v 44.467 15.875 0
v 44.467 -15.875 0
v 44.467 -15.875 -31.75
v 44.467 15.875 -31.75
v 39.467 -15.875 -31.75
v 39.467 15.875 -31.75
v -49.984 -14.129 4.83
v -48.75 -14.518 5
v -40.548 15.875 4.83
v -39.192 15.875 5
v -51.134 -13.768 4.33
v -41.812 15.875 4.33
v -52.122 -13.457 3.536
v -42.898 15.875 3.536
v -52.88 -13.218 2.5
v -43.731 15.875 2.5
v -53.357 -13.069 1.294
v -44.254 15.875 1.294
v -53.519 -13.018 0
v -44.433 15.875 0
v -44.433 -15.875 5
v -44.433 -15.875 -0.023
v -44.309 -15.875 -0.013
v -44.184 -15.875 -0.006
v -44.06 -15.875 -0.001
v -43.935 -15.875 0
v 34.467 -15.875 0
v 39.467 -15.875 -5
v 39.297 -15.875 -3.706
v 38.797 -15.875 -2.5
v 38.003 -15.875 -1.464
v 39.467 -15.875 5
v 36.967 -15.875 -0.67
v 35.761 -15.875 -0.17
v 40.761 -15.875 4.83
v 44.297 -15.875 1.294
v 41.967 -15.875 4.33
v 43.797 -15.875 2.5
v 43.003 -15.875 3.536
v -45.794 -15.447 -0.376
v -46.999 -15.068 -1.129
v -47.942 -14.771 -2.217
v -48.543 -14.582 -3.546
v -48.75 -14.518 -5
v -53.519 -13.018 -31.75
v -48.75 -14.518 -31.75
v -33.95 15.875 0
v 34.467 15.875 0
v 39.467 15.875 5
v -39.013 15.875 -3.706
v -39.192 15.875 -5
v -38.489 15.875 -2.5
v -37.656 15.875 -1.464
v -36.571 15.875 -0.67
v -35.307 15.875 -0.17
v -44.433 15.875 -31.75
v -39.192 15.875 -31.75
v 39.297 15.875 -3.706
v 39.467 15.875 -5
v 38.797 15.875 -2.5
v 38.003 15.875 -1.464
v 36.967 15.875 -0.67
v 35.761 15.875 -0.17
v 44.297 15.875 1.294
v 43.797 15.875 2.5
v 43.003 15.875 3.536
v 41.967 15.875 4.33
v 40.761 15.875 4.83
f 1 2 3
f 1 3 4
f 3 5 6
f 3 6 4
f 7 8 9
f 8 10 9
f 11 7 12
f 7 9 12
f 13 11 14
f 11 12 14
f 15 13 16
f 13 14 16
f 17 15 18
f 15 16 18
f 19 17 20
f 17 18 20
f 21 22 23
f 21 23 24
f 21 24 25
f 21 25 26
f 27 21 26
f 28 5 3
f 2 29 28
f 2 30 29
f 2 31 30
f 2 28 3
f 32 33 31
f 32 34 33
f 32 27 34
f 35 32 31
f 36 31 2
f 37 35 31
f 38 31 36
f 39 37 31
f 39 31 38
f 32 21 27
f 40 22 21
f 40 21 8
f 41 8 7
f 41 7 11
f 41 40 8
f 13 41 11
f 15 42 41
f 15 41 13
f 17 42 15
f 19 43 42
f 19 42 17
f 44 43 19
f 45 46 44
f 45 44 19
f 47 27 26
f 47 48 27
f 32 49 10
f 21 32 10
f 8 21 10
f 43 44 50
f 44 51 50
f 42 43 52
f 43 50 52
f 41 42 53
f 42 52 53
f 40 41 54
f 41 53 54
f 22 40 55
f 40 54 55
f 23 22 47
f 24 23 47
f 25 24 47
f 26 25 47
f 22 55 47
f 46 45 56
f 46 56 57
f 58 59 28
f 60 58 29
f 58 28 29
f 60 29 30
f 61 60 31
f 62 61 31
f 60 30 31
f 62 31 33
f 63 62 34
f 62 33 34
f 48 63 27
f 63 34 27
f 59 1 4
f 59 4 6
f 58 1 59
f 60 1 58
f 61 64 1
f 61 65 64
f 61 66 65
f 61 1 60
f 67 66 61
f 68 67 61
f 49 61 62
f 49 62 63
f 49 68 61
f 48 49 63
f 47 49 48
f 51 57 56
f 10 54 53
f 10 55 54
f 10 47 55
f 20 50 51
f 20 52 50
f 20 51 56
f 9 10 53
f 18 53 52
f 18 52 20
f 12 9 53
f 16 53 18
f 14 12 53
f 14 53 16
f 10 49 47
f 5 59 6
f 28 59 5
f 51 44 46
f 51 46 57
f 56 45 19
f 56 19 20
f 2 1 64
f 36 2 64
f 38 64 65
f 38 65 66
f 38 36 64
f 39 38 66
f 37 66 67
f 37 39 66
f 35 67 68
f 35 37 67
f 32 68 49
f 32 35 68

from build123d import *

# Parameters (mm, degrees)
BOSS_EXTRUDE1_DEPTH = 5
BOSS_EXTRUDE2_DEPTH = 31.75
FILLET1_R           = 5


with BuildPart() as part:
    # Sketch1 → Boss-Extrude1 (new body)
    with BuildSketch(Plane.XY):
        Polygon((-44.432958232964275, 15.875000000000018), (44.46704176703572, 15.875000000000021), (44.467041767035624, -15.874999999999979), (-44.43295823296417, -15.875000000000448), (-53.51922912646058, -13.017500000000476), align=None)
    extrude(amount=BOSS_EXTRUDE1_DEPTH)

    # Sketch2 → Boss-Extrude2 (add)
    with BuildSketch(Plane(origin=(0, 0, 0), x_dir=(-1, 0, 0), z_dir=(0, 0, -1))):
        Polygon((-39.467041767035624, 15.875000000000021), (-39.467041767035624, -15.875000000000448), (-44.467041767035624, -15.874999999999979), (-44.46704176703572, 15.875000000000021), align=None)
        Polygon((48.749533119375855, -14.51750000000046), (39.191534049354715, 15.875000000000021), (44.432958232964275, 15.875000000000018), (53.51922912646058, -13.017500000000476), align=None)
    extrude(amount=BOSS_EXTRUDE2_DEPTH)

    # Fillet1
    fillet1_edges = [part.edges().sort_by_distance(p)[0] for p in [
        (-48.97609367971243, 1.4287499999997717, 5),
        (-43.970533584365285, 0.6787499999997806, 0),
        (39.467041767035624, -2.1316e-13, 0),
        (44.46704176703567, 2.132e-14, 5),
    ]]
    fillet(fillet1_edges, radius=FILLET1_R)


solid = part.part
